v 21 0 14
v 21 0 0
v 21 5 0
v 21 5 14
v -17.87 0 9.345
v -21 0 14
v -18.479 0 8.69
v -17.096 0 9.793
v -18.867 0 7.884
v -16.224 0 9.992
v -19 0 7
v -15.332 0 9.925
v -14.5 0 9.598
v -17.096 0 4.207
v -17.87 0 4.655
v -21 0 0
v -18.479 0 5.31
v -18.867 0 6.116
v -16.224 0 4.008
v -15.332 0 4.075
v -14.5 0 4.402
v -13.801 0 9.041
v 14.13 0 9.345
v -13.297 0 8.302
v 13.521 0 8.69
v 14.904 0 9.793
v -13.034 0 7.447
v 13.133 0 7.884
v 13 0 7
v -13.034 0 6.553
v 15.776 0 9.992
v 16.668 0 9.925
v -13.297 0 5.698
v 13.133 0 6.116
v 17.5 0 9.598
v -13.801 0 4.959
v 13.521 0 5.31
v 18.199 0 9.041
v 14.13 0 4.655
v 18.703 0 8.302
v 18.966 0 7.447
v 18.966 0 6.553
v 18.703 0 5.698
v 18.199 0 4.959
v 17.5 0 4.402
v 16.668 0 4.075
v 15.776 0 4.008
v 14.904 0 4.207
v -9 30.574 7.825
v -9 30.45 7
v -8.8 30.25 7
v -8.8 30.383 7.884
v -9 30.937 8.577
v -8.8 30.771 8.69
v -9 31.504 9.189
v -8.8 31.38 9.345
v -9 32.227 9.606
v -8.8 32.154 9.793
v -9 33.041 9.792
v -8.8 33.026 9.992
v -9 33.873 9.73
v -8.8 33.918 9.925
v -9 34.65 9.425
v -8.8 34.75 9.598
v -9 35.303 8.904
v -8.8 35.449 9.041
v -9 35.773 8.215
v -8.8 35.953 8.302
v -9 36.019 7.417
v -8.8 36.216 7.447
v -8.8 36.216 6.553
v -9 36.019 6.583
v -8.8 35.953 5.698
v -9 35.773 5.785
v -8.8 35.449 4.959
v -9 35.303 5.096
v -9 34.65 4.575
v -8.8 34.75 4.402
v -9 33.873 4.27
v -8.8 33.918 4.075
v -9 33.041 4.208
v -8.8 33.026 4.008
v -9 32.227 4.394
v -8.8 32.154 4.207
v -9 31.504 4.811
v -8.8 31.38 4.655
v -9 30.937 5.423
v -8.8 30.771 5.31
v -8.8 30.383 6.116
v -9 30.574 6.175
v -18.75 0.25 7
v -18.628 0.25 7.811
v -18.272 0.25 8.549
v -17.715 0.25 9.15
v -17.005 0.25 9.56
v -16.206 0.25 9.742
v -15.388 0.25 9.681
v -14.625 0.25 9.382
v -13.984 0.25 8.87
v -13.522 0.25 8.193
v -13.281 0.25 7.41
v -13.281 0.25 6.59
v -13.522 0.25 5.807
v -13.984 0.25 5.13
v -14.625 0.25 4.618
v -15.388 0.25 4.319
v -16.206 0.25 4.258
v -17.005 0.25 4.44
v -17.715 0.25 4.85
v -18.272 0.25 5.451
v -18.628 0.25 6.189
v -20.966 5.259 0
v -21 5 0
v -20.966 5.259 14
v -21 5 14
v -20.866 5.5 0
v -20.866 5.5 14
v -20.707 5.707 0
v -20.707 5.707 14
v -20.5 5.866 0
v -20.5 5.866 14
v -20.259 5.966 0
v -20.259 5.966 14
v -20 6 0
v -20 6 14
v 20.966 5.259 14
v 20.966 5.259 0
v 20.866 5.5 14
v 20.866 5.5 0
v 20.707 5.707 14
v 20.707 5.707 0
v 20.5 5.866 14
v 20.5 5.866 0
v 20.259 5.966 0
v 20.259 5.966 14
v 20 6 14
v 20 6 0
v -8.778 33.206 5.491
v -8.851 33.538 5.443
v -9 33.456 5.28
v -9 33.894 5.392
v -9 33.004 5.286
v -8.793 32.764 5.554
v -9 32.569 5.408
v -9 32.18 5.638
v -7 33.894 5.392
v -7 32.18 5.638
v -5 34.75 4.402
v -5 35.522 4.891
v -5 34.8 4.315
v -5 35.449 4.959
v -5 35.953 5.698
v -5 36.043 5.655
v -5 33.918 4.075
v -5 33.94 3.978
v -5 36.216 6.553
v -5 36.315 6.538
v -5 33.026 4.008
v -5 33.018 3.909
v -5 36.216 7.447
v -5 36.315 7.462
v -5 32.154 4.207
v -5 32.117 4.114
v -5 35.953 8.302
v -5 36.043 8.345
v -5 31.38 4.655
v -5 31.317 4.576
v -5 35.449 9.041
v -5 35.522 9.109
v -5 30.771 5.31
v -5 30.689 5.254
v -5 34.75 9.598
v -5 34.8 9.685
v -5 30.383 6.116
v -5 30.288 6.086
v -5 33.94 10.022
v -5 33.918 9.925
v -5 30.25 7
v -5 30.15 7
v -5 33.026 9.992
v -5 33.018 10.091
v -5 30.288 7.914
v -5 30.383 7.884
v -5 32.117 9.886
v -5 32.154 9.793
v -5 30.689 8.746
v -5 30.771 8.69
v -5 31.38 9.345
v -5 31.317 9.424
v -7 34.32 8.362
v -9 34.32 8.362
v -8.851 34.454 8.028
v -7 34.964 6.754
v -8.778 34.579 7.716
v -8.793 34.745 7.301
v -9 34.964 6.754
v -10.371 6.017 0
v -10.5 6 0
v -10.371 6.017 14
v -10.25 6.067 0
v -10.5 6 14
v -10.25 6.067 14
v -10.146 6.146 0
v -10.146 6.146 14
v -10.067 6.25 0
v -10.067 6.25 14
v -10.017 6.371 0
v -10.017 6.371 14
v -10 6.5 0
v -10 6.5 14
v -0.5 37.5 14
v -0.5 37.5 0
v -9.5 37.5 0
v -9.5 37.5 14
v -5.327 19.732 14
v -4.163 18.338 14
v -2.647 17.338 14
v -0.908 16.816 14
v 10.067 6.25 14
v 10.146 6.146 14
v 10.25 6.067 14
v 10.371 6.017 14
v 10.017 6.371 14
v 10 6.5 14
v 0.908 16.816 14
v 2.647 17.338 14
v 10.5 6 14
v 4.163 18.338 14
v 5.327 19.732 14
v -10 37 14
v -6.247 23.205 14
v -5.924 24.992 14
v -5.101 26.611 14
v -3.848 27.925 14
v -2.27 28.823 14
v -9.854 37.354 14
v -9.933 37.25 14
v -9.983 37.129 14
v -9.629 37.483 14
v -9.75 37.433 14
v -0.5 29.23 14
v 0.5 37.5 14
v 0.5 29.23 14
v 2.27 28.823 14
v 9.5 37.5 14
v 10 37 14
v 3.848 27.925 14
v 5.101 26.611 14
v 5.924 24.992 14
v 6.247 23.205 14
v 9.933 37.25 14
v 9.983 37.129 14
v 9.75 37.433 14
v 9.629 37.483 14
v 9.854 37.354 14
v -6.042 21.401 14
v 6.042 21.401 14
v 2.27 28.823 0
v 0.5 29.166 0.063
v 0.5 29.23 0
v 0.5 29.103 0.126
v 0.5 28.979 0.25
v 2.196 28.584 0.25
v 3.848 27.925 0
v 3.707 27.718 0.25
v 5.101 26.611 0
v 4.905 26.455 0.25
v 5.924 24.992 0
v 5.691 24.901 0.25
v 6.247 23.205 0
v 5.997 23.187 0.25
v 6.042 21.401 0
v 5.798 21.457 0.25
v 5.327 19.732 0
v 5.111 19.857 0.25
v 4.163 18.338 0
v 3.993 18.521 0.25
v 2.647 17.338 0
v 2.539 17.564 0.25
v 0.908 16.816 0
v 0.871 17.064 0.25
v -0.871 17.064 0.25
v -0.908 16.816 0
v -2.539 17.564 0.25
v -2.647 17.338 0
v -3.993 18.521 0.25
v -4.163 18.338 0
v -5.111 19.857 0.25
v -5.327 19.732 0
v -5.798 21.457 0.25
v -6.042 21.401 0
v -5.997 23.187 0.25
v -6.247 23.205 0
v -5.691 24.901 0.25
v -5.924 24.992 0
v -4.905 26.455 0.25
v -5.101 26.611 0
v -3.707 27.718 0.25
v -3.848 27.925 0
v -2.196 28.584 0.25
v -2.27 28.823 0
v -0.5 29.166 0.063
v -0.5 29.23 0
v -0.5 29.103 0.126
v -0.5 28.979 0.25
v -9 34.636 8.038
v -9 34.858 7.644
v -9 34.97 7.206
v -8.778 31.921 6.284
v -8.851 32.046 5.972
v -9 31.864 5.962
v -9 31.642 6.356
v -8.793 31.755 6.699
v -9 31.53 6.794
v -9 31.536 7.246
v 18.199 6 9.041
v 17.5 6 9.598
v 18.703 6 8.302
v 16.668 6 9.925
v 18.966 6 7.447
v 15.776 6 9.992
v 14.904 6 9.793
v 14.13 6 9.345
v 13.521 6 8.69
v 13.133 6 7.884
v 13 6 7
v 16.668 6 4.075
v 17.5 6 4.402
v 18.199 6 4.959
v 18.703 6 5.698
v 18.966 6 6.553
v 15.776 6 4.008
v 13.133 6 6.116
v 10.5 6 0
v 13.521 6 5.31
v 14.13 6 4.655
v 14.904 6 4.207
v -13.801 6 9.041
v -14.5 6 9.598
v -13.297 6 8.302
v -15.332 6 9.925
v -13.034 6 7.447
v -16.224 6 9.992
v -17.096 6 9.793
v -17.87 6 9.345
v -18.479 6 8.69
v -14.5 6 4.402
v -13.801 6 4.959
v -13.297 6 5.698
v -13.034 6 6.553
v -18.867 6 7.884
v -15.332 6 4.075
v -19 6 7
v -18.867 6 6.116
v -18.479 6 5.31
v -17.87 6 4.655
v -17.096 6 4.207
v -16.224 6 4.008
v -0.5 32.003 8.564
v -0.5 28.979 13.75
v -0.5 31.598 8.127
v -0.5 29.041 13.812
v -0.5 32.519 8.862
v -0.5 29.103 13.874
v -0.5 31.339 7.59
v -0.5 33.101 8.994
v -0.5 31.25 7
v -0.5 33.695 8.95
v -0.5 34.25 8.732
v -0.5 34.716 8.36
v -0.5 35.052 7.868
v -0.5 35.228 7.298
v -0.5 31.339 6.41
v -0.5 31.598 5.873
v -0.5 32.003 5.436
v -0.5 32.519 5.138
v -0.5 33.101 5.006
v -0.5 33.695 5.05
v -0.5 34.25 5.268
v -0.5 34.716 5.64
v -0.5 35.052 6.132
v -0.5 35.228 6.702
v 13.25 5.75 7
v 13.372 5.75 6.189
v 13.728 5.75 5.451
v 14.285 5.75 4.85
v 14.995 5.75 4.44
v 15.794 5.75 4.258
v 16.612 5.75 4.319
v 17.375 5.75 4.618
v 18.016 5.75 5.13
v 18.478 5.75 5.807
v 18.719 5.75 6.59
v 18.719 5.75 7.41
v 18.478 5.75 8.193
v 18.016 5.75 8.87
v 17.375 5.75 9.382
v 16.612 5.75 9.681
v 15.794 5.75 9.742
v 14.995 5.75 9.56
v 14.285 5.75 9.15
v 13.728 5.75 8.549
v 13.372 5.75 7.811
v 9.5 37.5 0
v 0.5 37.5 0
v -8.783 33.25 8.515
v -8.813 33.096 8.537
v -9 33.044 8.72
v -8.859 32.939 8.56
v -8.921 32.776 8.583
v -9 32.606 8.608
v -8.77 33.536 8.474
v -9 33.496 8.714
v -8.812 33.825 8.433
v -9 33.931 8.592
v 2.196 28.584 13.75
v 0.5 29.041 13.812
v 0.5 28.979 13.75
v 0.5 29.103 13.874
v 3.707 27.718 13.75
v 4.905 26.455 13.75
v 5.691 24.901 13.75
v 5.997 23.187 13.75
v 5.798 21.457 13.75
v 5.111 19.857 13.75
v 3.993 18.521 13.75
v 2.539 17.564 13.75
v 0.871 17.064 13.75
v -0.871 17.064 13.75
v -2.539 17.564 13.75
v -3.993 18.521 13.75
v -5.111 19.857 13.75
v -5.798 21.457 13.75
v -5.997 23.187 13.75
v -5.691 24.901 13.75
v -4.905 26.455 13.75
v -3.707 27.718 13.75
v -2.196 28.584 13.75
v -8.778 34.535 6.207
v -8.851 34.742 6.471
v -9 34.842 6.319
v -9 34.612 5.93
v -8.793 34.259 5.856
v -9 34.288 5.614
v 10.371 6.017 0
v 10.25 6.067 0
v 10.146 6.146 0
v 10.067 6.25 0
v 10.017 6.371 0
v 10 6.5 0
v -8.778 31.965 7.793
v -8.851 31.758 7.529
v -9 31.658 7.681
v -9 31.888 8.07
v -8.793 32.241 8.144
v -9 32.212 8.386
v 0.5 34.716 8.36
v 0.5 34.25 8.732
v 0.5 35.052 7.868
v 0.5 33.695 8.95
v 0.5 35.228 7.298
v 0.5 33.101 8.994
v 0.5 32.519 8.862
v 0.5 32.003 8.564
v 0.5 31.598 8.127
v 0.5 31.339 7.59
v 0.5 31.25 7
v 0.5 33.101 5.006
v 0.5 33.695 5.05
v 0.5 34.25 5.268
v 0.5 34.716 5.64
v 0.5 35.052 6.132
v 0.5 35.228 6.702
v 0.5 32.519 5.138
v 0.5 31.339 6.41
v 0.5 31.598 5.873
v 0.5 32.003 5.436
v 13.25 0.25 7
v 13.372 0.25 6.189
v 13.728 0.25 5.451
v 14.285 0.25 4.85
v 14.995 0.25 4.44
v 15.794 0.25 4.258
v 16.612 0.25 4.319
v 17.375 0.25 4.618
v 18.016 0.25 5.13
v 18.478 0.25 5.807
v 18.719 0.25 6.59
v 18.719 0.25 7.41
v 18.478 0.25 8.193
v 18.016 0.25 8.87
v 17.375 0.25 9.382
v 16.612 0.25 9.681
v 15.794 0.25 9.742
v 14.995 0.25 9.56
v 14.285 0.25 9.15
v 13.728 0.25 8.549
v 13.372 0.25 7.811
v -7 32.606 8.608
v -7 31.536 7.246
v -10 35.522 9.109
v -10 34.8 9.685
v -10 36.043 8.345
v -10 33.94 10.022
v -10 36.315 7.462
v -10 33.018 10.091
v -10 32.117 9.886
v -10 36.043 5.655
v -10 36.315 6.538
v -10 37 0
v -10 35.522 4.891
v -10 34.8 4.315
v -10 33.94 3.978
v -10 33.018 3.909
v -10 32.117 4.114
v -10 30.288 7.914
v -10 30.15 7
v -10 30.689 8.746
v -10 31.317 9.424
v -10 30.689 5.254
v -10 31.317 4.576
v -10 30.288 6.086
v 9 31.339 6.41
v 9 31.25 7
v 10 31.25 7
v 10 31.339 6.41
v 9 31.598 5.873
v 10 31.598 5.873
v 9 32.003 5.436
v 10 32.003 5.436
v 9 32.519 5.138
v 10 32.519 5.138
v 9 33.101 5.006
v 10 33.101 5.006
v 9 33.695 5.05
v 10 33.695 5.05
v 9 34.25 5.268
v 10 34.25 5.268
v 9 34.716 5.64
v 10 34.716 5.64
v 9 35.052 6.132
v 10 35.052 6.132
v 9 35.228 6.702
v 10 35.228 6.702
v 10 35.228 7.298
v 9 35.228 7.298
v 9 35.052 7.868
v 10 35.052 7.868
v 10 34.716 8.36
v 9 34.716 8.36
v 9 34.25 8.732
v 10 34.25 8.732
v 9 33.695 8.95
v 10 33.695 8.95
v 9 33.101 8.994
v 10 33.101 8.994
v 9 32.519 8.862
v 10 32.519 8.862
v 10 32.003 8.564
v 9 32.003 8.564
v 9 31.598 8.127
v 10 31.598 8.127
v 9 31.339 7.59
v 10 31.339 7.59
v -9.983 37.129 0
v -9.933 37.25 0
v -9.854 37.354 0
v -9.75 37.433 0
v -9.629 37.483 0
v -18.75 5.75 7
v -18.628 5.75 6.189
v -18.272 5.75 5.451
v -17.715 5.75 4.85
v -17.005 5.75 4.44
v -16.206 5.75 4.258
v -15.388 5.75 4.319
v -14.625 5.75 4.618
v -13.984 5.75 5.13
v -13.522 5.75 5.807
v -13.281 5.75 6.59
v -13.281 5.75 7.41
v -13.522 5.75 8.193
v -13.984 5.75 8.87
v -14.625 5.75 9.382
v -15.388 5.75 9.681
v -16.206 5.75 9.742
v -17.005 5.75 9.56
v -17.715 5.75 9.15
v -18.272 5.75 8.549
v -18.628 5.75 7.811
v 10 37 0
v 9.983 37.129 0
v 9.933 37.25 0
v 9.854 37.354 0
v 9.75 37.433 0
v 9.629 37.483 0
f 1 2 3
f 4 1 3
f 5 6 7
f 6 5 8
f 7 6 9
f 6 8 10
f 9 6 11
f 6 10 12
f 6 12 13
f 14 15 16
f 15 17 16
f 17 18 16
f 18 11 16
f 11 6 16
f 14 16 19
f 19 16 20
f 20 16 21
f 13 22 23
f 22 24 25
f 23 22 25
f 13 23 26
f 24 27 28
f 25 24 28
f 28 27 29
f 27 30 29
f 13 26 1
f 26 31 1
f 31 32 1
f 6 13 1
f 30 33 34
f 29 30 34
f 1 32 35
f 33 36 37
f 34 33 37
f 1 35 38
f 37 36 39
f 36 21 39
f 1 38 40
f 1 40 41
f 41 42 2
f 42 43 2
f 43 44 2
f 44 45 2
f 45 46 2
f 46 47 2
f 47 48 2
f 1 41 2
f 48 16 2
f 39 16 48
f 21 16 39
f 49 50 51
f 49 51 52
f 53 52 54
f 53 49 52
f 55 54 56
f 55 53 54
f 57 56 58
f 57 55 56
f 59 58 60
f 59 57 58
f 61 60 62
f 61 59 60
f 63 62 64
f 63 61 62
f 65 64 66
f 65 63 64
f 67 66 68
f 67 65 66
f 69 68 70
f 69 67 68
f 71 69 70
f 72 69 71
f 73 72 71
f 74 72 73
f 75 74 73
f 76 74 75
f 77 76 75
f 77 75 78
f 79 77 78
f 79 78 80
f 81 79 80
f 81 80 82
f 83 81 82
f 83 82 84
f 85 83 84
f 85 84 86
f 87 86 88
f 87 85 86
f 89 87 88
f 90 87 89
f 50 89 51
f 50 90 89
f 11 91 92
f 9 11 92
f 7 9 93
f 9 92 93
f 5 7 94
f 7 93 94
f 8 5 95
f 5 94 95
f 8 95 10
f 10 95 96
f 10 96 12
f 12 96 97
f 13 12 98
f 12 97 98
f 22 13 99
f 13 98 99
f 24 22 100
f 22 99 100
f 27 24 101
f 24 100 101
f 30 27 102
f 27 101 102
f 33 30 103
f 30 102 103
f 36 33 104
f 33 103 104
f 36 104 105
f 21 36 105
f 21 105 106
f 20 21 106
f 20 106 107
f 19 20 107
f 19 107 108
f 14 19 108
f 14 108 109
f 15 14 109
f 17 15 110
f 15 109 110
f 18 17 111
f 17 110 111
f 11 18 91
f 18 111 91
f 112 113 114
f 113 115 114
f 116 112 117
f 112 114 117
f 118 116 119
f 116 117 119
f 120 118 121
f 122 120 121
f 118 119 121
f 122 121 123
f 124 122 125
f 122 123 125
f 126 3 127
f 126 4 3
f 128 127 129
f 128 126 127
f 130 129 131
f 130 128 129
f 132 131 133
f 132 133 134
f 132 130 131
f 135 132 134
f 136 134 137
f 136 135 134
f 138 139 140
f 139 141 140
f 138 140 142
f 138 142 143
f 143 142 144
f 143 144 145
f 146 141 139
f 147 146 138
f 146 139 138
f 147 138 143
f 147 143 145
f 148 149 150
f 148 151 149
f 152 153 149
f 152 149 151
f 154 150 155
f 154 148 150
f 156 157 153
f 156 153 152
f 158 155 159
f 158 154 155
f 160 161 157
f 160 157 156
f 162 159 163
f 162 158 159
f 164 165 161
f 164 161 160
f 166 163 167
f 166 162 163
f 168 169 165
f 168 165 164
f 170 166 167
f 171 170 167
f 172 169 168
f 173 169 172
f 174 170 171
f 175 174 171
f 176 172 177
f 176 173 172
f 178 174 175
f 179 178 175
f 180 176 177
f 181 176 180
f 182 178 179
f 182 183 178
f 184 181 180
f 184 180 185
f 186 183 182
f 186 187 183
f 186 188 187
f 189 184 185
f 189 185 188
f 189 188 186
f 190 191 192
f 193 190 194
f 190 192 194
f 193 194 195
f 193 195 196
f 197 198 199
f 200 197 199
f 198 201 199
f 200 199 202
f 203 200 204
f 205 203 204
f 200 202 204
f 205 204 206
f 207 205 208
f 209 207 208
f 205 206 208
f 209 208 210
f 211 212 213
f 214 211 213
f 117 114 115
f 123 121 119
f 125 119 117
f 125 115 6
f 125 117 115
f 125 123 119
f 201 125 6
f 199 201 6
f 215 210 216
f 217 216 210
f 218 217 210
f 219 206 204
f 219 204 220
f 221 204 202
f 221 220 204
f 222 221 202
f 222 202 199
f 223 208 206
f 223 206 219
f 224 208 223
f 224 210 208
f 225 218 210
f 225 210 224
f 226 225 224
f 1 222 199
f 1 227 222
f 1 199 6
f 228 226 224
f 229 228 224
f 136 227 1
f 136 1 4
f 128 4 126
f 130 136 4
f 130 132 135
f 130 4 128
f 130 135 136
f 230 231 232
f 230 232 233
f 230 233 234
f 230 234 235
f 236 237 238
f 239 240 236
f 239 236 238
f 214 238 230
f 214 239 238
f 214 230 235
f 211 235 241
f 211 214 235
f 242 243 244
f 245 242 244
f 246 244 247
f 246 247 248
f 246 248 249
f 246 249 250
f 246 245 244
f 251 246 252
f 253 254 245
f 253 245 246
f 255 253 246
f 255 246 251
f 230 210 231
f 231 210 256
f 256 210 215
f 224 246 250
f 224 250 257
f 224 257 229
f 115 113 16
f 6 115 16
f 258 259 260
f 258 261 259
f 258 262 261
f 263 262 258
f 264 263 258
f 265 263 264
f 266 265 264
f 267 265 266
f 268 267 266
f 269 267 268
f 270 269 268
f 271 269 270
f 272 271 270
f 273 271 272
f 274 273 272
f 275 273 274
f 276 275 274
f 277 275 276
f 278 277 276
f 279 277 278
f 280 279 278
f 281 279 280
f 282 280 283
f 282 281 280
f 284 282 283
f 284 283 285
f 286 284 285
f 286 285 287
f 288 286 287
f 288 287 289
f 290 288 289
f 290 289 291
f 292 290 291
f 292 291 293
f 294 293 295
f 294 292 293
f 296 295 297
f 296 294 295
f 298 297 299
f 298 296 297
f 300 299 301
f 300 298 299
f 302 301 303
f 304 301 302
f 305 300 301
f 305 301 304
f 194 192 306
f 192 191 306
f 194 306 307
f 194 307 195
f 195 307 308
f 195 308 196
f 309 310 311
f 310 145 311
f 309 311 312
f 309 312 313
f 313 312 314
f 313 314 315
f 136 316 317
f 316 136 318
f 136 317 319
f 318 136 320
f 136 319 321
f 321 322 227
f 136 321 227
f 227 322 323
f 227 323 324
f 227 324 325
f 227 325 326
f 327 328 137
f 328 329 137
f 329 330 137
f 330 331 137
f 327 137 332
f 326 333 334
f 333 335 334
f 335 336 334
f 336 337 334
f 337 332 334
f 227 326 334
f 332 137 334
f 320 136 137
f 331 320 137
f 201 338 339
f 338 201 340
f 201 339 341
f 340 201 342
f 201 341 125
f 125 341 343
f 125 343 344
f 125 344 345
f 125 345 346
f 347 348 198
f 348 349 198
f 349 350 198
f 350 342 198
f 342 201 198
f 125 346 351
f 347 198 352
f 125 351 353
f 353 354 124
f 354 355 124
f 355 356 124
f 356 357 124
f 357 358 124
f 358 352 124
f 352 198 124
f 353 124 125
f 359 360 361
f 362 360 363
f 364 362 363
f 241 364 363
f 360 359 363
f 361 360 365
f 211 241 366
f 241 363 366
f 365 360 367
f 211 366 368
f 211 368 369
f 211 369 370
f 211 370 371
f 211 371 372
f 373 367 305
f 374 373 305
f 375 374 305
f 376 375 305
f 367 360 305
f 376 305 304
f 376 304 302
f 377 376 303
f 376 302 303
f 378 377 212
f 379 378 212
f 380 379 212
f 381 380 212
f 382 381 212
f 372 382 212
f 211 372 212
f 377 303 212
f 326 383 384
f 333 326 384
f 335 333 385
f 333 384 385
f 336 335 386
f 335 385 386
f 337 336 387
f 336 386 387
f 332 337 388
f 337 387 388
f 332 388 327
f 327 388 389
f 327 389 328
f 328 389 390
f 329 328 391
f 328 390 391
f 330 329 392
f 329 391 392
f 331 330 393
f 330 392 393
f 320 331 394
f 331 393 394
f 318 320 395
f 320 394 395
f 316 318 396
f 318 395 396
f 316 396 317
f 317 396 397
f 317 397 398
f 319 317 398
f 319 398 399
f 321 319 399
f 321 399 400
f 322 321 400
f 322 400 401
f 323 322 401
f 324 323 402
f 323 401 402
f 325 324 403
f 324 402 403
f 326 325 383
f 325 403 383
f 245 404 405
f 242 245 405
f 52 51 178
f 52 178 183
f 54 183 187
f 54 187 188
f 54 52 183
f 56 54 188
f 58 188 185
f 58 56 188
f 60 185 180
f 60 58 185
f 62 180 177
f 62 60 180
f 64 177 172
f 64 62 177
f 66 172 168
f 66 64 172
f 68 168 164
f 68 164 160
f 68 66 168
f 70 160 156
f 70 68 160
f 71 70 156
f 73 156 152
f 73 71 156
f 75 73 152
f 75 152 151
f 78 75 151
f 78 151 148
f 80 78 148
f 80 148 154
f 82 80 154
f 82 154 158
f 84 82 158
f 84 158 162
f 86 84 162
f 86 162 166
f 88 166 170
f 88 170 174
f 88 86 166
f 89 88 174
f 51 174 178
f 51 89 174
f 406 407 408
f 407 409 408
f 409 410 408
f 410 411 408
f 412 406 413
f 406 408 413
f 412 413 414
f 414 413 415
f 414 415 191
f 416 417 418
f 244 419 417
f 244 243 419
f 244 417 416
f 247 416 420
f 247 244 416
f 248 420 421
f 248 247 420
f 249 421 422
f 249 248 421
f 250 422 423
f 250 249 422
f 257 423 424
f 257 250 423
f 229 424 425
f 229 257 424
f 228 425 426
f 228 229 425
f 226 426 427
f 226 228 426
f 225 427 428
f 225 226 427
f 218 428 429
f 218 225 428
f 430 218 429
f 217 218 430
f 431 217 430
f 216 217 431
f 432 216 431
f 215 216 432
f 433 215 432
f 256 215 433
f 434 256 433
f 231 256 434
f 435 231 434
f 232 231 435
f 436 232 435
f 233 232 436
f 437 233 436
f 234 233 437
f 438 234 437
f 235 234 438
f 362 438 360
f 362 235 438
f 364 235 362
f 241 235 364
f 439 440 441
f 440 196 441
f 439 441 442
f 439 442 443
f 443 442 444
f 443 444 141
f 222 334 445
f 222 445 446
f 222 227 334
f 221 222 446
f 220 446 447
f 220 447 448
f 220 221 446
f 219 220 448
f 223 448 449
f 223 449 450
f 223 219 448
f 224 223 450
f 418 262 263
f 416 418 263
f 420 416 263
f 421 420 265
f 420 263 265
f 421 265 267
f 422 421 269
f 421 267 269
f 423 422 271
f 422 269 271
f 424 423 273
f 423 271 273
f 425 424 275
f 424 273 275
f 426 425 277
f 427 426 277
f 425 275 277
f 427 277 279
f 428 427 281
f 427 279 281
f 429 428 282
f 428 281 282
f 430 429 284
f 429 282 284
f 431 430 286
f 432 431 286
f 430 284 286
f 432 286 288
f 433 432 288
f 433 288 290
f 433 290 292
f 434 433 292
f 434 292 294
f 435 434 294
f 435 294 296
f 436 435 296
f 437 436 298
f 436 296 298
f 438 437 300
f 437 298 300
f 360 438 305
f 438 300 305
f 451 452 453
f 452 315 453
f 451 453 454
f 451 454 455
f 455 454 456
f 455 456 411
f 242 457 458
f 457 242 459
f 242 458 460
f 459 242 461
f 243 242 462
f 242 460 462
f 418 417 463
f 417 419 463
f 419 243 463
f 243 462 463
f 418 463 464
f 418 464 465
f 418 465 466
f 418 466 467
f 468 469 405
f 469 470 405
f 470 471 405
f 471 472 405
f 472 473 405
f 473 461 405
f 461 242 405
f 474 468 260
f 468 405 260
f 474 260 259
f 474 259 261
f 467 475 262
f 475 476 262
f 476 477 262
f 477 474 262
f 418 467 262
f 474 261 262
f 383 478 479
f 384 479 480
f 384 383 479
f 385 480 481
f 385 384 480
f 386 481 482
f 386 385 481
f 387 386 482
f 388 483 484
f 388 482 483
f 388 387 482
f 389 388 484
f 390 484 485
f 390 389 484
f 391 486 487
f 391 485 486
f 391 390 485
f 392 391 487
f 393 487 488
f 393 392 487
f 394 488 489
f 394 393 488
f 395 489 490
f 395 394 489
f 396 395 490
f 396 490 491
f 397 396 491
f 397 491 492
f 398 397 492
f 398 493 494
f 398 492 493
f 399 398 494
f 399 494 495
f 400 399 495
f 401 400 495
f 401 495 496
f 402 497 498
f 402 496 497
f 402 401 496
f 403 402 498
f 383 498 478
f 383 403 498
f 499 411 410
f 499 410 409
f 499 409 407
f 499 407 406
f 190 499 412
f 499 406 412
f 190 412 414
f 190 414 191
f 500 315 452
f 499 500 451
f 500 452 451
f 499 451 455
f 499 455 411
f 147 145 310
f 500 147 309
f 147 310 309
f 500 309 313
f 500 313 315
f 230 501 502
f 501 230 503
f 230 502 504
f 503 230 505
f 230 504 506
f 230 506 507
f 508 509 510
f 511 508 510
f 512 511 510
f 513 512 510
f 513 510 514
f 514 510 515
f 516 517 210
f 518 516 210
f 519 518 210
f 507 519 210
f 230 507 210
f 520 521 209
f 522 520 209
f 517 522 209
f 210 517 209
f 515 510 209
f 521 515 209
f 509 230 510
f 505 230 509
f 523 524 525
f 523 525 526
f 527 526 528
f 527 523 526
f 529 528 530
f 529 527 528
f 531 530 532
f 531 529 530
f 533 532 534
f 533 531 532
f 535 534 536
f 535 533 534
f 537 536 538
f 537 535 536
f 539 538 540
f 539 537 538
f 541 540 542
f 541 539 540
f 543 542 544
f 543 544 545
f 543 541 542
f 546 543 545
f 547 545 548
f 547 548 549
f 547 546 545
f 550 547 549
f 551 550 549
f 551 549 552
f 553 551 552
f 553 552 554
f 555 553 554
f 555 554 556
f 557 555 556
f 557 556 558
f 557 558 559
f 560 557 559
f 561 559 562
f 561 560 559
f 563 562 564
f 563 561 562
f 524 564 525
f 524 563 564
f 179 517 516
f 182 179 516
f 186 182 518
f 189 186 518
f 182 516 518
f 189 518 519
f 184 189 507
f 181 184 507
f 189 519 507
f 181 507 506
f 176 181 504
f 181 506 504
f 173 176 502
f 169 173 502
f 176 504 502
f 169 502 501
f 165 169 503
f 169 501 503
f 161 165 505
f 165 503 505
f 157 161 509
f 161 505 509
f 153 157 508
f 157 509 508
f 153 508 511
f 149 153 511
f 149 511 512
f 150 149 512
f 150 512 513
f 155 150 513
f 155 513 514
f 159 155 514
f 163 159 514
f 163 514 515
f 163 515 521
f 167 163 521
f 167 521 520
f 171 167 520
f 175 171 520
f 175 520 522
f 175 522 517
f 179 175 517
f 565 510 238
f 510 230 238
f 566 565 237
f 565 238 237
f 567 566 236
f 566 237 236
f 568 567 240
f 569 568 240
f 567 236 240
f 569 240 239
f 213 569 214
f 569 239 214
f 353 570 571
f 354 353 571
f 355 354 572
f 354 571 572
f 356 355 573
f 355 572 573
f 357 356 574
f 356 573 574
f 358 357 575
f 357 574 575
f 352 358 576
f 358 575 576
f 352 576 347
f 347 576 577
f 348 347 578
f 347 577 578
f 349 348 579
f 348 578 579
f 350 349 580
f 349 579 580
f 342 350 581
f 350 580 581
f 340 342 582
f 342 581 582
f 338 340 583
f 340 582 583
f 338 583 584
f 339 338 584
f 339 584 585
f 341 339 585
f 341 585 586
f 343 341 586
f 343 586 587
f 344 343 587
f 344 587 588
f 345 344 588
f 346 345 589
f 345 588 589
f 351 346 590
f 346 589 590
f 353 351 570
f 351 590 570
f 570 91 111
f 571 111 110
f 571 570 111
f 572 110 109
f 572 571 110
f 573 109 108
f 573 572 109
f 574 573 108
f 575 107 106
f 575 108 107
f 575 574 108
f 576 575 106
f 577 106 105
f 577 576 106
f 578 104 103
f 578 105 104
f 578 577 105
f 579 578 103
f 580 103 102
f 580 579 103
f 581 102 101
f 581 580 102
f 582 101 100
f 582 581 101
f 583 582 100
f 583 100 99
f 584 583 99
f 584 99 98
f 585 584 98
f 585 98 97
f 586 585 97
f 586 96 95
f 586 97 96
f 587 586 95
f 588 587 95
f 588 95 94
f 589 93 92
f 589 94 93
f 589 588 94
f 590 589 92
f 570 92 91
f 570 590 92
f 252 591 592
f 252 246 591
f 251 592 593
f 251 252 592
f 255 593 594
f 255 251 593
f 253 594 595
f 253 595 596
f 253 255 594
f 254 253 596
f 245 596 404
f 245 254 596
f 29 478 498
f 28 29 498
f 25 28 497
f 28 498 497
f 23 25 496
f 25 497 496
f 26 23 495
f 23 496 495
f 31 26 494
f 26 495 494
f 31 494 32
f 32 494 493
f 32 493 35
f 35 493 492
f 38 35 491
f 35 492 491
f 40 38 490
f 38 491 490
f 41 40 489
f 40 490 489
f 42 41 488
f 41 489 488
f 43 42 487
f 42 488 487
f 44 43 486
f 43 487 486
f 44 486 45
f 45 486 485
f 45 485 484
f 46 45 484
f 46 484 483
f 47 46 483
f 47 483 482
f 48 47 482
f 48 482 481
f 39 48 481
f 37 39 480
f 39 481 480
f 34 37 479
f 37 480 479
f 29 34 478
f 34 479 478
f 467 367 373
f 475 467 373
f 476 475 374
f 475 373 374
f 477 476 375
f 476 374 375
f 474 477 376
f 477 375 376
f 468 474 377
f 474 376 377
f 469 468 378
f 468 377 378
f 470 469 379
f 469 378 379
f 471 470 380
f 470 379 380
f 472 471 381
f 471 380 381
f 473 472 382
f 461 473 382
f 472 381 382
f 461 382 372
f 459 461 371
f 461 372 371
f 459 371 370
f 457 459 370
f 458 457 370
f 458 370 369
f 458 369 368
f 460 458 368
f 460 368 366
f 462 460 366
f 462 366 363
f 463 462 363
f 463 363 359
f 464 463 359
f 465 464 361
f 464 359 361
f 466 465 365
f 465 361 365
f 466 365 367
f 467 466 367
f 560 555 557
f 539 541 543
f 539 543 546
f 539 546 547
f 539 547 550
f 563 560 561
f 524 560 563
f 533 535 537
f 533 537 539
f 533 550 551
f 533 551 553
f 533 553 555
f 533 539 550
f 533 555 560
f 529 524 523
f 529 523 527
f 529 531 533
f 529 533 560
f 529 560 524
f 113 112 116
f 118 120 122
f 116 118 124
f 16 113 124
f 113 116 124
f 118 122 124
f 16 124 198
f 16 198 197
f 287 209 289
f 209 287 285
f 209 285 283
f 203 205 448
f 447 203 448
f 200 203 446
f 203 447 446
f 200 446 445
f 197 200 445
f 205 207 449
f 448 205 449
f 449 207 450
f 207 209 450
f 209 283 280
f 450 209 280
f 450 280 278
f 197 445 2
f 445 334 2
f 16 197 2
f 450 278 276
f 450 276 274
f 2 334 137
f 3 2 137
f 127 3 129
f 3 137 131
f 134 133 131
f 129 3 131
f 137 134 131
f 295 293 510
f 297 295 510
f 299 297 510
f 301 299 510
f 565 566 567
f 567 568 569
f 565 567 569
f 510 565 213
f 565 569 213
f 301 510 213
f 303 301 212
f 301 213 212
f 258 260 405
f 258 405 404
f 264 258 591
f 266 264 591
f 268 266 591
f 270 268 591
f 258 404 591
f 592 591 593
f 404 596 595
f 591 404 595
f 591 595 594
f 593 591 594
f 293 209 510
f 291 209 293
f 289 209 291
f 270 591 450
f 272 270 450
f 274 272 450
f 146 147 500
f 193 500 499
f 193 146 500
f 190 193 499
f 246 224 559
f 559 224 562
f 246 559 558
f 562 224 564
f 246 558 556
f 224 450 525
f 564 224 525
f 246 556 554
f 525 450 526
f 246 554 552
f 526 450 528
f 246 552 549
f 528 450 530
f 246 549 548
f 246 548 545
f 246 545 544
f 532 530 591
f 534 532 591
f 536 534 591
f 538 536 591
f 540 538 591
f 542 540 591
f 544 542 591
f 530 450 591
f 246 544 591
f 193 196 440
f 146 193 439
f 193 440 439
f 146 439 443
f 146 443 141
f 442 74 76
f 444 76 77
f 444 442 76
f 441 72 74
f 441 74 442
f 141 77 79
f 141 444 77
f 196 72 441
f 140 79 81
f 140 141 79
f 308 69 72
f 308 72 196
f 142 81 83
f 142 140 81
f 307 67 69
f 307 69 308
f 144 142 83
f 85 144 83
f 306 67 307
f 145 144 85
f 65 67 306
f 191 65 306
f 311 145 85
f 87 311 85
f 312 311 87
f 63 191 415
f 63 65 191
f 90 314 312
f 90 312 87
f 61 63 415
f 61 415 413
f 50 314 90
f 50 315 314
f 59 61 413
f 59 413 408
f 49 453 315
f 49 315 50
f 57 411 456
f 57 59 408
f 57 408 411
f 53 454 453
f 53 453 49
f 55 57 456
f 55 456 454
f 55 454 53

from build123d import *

# Parameters (mm, degrees)
BOSS_EXTRUDE1_DEPTH     = 14
CUT_EXTRUDE1_DEPTH      = 46.202322949
CUT_EXTRUDE1_DEPTH_BACK = 6
SKETCH3_R               = 2.75
FILLET1_R               = 1
FILLET2_R               = 0.5
CHAMFER1_SIZE           = 0.25
SKETCH4_R               = 3.1
CUT_EXTRUDE2_DEPTH      = 1
SKETCH5_R               = 3.1
SKETCH5_R_2             = 3
CUT_EXTRUDE3_DEPTH      = 4
CHAMFER2_SIZE           = 0.2
CUT_EXTRUDE4_DEPTH      = 2
SKETCH7_R               = 2
BOSS_EXTRUDE2_DEPTH     = 1
CUT_EXTRUDE5_START      = -1
SKETCH8_R               = 2
CUT_EXTRUDE5_DEPTH      = 1
SKETCH9_R               = 1.732050808
CUT_EXTRUDE6_DEPTH      = 1
CUT_EXTRUDE6_DRAFT      = -45


with BuildPart() as part:
    # Sketch1 → Boss-Extrude1 (new body)
    with BuildSketch(Plane.XY):
        with BuildLine():
            Line((-21, 0), (21, 0))
            Line((21, 0), (21, 6))
            Line((21, 6), (10, 6))
            Line((10, 6), (10, 37.5))
            Line((10, 37.5), (0.5, 37.5))
            Line((0.5, 37.5), (0.5, 28.979130372))
            ThreePointArc((0.5, 28.979130372), (0, 17), (-0.5, 28.979130372))
            Line((-0.5, 28.979130372), (-0.5, 37.5))
            Line((-0.5, 37.5), (-10, 37.5))
            Line((-10, 37.5), (-10, 6))
            Line((-10, 6), (-21, 6))
            Line((-21, 6), (-21, 0))
        make_face()
    extrude(amount=BOSS_EXTRUDE1_DEPTH)

    # Sketch3 → Cut-Extrude1 (cut, two sides: drawn at the far end of the back side and taken through both)
    with BuildSketch(Plane.XZ.offset(-CUT_EXTRUDE1_DEPTH_BACK)):
        with Locations(Location((-16, 7, 0), (0, 0, 180))):
            Circle(SKETCH3_R)
        with Locations(Location((16, 7, 0), (0, 0, 180))):
            Circle(SKETCH3_R)
    extrude(amount=CUT_EXTRUDE1_DEPTH + CUT_EXTRUDE1_DEPTH_BACK, mode=Mode.SUBTRACT)

    # Fillet1
    fillet1_edges = [part.edges().sort_by_distance(p)[0] for p in [
        (-21, 6, 7),
        (21, 6, 7),
    ]]
    fillet(fillet1_edges, radius=FILLET1_R)

    # Fillet2
    fillet2_edges = [part.edges().sort_by_distance(p)[0] for p in [
        (-10, 6, 7),
        (-10, 37.5, 7),
        (10, 37.5, 7),
        (10, 6, 7),
    ]]
    fillet(fillet2_edges, radius=FILLET2_R)

    # Chamfer1
    chamfer1_edges = [part.edges().sort_by_distance(p)[0] for p in [
        (0, 17, 0),
        (0, 17, 14),
        (18.75, 6, 7),
        (18.75, 0, 7),
        (-13.25, 6, 7),
        (-13.25, 0, 7),
    ]]
    chamfer(chamfer1_edges, length=CHAMFER1_SIZE)

    # Sketch4 → Cut-Extrude2 (cut)
    with BuildSketch(Plane.ZY.offset(10)):
        with Locations(Location((7, 33.25, 0), (0, 0, 270))):
            Circle(SKETCH4_R)
    extrude(amount=-CUT_EXTRUDE2_DEPTH, mode=Mode.SUBTRACT)

    # Sketch5 → Cut-Extrude3 (cut)
    with BuildSketch(Plane.ZY.offset(9)):
        with Locations(Location((7, 33.25, 0), (0, 0, 270))):
            Circle(SKETCH5_R)
        with Locations(Location((7, 33.25, 0), (0, 0, 270))):
            Circle(SKETCH5_R_2, mode=Mode.SUBTRACT)
    extrude(amount=-CUT_EXTRUDE3_DEPTH, mode=Mode.SUBTRACT)

    # Chamfer2
    chamfer2_edges = [part.edges().sort_by_distance(p)[0] for p in [
        (-9, 36.25, 7),
    ]]
    chamfer(chamfer2_edges, length=CHAMFER2_SIZE)

    # Sketch6 → Cut-Extrude4 (cut)
    with BuildSketch(Plane.ZY.offset(9)):
        Polygon((7.246062581, 31.535516636), (8.607817438, 32.605854763), (8.361754858, 34.320338128), (6.753937419, 34.964483364), (5.392182562, 33.894145237), (5.638245142, 32.179661872), align=None)
    extrude(amount=-CUT_EXTRUDE4_DEPTH, mode=Mode.SUBTRACT)

    # Sketch7 → Boss-Extrude2 (add)
    with BuildSketch(Plane(origin=(-0.5, 0, 0), x_dir=(0, 0, -1), z_dir=(1, 0, 0))):
        with Locations(Location((-7, 33.25, 0), (0, 0, 270))):
            Circle(SKETCH7_R)
    extrude(amount=BOSS_EXTRUDE2_DEPTH)

    # Sketch8 → Cut-Extrude5 (cut)
    with BuildSketch(Plane(origin=(10, 0, 0), x_dir=(0, 0, -1), z_dir=(1, 0, 0)).offset(CUT_EXTRUDE5_START)):
        with Locations(Location((-7, 33.25, 0), (0, 0, 270))):
            Circle(SKETCH8_R)
    extrude(amount=CUT_EXTRUDE5_DEPTH, mode=Mode.SUBTRACT)


with BuildPart() as cut_extrude6_tool:
    # Sketch9 → Cut-Extrude6 (with draft: the straight prism first)
    with BuildSketch(Plane.ZY.offset(9)):
        with Locations((7, 33.25)):
            Circle(SKETCH9_R)
    extrude(amount=-CUT_EXTRUDE6_DEPTH)
    # Cut-Extrude6: the draft: its side faces are tilted about the plane it starts from
    cut_extrude6_sides = [cut_extrude6_tool.faces().sort_by_distance(p)[0] for p in [
        (-8.5, 33.25, 5.267949192),
    ]]
    draft(cut_extrude6_sides, Plane.ZY.offset(9), CUT_EXTRUDE6_DRAFT)


with BuildPart() as part_1:
    add(part.part)

    # Cut-Extrude6: cut by cut_extrude6_tool
    add(cut_extrude6_tool.part, mode=Mode.SUBTRACT)


solid = part_1.part
